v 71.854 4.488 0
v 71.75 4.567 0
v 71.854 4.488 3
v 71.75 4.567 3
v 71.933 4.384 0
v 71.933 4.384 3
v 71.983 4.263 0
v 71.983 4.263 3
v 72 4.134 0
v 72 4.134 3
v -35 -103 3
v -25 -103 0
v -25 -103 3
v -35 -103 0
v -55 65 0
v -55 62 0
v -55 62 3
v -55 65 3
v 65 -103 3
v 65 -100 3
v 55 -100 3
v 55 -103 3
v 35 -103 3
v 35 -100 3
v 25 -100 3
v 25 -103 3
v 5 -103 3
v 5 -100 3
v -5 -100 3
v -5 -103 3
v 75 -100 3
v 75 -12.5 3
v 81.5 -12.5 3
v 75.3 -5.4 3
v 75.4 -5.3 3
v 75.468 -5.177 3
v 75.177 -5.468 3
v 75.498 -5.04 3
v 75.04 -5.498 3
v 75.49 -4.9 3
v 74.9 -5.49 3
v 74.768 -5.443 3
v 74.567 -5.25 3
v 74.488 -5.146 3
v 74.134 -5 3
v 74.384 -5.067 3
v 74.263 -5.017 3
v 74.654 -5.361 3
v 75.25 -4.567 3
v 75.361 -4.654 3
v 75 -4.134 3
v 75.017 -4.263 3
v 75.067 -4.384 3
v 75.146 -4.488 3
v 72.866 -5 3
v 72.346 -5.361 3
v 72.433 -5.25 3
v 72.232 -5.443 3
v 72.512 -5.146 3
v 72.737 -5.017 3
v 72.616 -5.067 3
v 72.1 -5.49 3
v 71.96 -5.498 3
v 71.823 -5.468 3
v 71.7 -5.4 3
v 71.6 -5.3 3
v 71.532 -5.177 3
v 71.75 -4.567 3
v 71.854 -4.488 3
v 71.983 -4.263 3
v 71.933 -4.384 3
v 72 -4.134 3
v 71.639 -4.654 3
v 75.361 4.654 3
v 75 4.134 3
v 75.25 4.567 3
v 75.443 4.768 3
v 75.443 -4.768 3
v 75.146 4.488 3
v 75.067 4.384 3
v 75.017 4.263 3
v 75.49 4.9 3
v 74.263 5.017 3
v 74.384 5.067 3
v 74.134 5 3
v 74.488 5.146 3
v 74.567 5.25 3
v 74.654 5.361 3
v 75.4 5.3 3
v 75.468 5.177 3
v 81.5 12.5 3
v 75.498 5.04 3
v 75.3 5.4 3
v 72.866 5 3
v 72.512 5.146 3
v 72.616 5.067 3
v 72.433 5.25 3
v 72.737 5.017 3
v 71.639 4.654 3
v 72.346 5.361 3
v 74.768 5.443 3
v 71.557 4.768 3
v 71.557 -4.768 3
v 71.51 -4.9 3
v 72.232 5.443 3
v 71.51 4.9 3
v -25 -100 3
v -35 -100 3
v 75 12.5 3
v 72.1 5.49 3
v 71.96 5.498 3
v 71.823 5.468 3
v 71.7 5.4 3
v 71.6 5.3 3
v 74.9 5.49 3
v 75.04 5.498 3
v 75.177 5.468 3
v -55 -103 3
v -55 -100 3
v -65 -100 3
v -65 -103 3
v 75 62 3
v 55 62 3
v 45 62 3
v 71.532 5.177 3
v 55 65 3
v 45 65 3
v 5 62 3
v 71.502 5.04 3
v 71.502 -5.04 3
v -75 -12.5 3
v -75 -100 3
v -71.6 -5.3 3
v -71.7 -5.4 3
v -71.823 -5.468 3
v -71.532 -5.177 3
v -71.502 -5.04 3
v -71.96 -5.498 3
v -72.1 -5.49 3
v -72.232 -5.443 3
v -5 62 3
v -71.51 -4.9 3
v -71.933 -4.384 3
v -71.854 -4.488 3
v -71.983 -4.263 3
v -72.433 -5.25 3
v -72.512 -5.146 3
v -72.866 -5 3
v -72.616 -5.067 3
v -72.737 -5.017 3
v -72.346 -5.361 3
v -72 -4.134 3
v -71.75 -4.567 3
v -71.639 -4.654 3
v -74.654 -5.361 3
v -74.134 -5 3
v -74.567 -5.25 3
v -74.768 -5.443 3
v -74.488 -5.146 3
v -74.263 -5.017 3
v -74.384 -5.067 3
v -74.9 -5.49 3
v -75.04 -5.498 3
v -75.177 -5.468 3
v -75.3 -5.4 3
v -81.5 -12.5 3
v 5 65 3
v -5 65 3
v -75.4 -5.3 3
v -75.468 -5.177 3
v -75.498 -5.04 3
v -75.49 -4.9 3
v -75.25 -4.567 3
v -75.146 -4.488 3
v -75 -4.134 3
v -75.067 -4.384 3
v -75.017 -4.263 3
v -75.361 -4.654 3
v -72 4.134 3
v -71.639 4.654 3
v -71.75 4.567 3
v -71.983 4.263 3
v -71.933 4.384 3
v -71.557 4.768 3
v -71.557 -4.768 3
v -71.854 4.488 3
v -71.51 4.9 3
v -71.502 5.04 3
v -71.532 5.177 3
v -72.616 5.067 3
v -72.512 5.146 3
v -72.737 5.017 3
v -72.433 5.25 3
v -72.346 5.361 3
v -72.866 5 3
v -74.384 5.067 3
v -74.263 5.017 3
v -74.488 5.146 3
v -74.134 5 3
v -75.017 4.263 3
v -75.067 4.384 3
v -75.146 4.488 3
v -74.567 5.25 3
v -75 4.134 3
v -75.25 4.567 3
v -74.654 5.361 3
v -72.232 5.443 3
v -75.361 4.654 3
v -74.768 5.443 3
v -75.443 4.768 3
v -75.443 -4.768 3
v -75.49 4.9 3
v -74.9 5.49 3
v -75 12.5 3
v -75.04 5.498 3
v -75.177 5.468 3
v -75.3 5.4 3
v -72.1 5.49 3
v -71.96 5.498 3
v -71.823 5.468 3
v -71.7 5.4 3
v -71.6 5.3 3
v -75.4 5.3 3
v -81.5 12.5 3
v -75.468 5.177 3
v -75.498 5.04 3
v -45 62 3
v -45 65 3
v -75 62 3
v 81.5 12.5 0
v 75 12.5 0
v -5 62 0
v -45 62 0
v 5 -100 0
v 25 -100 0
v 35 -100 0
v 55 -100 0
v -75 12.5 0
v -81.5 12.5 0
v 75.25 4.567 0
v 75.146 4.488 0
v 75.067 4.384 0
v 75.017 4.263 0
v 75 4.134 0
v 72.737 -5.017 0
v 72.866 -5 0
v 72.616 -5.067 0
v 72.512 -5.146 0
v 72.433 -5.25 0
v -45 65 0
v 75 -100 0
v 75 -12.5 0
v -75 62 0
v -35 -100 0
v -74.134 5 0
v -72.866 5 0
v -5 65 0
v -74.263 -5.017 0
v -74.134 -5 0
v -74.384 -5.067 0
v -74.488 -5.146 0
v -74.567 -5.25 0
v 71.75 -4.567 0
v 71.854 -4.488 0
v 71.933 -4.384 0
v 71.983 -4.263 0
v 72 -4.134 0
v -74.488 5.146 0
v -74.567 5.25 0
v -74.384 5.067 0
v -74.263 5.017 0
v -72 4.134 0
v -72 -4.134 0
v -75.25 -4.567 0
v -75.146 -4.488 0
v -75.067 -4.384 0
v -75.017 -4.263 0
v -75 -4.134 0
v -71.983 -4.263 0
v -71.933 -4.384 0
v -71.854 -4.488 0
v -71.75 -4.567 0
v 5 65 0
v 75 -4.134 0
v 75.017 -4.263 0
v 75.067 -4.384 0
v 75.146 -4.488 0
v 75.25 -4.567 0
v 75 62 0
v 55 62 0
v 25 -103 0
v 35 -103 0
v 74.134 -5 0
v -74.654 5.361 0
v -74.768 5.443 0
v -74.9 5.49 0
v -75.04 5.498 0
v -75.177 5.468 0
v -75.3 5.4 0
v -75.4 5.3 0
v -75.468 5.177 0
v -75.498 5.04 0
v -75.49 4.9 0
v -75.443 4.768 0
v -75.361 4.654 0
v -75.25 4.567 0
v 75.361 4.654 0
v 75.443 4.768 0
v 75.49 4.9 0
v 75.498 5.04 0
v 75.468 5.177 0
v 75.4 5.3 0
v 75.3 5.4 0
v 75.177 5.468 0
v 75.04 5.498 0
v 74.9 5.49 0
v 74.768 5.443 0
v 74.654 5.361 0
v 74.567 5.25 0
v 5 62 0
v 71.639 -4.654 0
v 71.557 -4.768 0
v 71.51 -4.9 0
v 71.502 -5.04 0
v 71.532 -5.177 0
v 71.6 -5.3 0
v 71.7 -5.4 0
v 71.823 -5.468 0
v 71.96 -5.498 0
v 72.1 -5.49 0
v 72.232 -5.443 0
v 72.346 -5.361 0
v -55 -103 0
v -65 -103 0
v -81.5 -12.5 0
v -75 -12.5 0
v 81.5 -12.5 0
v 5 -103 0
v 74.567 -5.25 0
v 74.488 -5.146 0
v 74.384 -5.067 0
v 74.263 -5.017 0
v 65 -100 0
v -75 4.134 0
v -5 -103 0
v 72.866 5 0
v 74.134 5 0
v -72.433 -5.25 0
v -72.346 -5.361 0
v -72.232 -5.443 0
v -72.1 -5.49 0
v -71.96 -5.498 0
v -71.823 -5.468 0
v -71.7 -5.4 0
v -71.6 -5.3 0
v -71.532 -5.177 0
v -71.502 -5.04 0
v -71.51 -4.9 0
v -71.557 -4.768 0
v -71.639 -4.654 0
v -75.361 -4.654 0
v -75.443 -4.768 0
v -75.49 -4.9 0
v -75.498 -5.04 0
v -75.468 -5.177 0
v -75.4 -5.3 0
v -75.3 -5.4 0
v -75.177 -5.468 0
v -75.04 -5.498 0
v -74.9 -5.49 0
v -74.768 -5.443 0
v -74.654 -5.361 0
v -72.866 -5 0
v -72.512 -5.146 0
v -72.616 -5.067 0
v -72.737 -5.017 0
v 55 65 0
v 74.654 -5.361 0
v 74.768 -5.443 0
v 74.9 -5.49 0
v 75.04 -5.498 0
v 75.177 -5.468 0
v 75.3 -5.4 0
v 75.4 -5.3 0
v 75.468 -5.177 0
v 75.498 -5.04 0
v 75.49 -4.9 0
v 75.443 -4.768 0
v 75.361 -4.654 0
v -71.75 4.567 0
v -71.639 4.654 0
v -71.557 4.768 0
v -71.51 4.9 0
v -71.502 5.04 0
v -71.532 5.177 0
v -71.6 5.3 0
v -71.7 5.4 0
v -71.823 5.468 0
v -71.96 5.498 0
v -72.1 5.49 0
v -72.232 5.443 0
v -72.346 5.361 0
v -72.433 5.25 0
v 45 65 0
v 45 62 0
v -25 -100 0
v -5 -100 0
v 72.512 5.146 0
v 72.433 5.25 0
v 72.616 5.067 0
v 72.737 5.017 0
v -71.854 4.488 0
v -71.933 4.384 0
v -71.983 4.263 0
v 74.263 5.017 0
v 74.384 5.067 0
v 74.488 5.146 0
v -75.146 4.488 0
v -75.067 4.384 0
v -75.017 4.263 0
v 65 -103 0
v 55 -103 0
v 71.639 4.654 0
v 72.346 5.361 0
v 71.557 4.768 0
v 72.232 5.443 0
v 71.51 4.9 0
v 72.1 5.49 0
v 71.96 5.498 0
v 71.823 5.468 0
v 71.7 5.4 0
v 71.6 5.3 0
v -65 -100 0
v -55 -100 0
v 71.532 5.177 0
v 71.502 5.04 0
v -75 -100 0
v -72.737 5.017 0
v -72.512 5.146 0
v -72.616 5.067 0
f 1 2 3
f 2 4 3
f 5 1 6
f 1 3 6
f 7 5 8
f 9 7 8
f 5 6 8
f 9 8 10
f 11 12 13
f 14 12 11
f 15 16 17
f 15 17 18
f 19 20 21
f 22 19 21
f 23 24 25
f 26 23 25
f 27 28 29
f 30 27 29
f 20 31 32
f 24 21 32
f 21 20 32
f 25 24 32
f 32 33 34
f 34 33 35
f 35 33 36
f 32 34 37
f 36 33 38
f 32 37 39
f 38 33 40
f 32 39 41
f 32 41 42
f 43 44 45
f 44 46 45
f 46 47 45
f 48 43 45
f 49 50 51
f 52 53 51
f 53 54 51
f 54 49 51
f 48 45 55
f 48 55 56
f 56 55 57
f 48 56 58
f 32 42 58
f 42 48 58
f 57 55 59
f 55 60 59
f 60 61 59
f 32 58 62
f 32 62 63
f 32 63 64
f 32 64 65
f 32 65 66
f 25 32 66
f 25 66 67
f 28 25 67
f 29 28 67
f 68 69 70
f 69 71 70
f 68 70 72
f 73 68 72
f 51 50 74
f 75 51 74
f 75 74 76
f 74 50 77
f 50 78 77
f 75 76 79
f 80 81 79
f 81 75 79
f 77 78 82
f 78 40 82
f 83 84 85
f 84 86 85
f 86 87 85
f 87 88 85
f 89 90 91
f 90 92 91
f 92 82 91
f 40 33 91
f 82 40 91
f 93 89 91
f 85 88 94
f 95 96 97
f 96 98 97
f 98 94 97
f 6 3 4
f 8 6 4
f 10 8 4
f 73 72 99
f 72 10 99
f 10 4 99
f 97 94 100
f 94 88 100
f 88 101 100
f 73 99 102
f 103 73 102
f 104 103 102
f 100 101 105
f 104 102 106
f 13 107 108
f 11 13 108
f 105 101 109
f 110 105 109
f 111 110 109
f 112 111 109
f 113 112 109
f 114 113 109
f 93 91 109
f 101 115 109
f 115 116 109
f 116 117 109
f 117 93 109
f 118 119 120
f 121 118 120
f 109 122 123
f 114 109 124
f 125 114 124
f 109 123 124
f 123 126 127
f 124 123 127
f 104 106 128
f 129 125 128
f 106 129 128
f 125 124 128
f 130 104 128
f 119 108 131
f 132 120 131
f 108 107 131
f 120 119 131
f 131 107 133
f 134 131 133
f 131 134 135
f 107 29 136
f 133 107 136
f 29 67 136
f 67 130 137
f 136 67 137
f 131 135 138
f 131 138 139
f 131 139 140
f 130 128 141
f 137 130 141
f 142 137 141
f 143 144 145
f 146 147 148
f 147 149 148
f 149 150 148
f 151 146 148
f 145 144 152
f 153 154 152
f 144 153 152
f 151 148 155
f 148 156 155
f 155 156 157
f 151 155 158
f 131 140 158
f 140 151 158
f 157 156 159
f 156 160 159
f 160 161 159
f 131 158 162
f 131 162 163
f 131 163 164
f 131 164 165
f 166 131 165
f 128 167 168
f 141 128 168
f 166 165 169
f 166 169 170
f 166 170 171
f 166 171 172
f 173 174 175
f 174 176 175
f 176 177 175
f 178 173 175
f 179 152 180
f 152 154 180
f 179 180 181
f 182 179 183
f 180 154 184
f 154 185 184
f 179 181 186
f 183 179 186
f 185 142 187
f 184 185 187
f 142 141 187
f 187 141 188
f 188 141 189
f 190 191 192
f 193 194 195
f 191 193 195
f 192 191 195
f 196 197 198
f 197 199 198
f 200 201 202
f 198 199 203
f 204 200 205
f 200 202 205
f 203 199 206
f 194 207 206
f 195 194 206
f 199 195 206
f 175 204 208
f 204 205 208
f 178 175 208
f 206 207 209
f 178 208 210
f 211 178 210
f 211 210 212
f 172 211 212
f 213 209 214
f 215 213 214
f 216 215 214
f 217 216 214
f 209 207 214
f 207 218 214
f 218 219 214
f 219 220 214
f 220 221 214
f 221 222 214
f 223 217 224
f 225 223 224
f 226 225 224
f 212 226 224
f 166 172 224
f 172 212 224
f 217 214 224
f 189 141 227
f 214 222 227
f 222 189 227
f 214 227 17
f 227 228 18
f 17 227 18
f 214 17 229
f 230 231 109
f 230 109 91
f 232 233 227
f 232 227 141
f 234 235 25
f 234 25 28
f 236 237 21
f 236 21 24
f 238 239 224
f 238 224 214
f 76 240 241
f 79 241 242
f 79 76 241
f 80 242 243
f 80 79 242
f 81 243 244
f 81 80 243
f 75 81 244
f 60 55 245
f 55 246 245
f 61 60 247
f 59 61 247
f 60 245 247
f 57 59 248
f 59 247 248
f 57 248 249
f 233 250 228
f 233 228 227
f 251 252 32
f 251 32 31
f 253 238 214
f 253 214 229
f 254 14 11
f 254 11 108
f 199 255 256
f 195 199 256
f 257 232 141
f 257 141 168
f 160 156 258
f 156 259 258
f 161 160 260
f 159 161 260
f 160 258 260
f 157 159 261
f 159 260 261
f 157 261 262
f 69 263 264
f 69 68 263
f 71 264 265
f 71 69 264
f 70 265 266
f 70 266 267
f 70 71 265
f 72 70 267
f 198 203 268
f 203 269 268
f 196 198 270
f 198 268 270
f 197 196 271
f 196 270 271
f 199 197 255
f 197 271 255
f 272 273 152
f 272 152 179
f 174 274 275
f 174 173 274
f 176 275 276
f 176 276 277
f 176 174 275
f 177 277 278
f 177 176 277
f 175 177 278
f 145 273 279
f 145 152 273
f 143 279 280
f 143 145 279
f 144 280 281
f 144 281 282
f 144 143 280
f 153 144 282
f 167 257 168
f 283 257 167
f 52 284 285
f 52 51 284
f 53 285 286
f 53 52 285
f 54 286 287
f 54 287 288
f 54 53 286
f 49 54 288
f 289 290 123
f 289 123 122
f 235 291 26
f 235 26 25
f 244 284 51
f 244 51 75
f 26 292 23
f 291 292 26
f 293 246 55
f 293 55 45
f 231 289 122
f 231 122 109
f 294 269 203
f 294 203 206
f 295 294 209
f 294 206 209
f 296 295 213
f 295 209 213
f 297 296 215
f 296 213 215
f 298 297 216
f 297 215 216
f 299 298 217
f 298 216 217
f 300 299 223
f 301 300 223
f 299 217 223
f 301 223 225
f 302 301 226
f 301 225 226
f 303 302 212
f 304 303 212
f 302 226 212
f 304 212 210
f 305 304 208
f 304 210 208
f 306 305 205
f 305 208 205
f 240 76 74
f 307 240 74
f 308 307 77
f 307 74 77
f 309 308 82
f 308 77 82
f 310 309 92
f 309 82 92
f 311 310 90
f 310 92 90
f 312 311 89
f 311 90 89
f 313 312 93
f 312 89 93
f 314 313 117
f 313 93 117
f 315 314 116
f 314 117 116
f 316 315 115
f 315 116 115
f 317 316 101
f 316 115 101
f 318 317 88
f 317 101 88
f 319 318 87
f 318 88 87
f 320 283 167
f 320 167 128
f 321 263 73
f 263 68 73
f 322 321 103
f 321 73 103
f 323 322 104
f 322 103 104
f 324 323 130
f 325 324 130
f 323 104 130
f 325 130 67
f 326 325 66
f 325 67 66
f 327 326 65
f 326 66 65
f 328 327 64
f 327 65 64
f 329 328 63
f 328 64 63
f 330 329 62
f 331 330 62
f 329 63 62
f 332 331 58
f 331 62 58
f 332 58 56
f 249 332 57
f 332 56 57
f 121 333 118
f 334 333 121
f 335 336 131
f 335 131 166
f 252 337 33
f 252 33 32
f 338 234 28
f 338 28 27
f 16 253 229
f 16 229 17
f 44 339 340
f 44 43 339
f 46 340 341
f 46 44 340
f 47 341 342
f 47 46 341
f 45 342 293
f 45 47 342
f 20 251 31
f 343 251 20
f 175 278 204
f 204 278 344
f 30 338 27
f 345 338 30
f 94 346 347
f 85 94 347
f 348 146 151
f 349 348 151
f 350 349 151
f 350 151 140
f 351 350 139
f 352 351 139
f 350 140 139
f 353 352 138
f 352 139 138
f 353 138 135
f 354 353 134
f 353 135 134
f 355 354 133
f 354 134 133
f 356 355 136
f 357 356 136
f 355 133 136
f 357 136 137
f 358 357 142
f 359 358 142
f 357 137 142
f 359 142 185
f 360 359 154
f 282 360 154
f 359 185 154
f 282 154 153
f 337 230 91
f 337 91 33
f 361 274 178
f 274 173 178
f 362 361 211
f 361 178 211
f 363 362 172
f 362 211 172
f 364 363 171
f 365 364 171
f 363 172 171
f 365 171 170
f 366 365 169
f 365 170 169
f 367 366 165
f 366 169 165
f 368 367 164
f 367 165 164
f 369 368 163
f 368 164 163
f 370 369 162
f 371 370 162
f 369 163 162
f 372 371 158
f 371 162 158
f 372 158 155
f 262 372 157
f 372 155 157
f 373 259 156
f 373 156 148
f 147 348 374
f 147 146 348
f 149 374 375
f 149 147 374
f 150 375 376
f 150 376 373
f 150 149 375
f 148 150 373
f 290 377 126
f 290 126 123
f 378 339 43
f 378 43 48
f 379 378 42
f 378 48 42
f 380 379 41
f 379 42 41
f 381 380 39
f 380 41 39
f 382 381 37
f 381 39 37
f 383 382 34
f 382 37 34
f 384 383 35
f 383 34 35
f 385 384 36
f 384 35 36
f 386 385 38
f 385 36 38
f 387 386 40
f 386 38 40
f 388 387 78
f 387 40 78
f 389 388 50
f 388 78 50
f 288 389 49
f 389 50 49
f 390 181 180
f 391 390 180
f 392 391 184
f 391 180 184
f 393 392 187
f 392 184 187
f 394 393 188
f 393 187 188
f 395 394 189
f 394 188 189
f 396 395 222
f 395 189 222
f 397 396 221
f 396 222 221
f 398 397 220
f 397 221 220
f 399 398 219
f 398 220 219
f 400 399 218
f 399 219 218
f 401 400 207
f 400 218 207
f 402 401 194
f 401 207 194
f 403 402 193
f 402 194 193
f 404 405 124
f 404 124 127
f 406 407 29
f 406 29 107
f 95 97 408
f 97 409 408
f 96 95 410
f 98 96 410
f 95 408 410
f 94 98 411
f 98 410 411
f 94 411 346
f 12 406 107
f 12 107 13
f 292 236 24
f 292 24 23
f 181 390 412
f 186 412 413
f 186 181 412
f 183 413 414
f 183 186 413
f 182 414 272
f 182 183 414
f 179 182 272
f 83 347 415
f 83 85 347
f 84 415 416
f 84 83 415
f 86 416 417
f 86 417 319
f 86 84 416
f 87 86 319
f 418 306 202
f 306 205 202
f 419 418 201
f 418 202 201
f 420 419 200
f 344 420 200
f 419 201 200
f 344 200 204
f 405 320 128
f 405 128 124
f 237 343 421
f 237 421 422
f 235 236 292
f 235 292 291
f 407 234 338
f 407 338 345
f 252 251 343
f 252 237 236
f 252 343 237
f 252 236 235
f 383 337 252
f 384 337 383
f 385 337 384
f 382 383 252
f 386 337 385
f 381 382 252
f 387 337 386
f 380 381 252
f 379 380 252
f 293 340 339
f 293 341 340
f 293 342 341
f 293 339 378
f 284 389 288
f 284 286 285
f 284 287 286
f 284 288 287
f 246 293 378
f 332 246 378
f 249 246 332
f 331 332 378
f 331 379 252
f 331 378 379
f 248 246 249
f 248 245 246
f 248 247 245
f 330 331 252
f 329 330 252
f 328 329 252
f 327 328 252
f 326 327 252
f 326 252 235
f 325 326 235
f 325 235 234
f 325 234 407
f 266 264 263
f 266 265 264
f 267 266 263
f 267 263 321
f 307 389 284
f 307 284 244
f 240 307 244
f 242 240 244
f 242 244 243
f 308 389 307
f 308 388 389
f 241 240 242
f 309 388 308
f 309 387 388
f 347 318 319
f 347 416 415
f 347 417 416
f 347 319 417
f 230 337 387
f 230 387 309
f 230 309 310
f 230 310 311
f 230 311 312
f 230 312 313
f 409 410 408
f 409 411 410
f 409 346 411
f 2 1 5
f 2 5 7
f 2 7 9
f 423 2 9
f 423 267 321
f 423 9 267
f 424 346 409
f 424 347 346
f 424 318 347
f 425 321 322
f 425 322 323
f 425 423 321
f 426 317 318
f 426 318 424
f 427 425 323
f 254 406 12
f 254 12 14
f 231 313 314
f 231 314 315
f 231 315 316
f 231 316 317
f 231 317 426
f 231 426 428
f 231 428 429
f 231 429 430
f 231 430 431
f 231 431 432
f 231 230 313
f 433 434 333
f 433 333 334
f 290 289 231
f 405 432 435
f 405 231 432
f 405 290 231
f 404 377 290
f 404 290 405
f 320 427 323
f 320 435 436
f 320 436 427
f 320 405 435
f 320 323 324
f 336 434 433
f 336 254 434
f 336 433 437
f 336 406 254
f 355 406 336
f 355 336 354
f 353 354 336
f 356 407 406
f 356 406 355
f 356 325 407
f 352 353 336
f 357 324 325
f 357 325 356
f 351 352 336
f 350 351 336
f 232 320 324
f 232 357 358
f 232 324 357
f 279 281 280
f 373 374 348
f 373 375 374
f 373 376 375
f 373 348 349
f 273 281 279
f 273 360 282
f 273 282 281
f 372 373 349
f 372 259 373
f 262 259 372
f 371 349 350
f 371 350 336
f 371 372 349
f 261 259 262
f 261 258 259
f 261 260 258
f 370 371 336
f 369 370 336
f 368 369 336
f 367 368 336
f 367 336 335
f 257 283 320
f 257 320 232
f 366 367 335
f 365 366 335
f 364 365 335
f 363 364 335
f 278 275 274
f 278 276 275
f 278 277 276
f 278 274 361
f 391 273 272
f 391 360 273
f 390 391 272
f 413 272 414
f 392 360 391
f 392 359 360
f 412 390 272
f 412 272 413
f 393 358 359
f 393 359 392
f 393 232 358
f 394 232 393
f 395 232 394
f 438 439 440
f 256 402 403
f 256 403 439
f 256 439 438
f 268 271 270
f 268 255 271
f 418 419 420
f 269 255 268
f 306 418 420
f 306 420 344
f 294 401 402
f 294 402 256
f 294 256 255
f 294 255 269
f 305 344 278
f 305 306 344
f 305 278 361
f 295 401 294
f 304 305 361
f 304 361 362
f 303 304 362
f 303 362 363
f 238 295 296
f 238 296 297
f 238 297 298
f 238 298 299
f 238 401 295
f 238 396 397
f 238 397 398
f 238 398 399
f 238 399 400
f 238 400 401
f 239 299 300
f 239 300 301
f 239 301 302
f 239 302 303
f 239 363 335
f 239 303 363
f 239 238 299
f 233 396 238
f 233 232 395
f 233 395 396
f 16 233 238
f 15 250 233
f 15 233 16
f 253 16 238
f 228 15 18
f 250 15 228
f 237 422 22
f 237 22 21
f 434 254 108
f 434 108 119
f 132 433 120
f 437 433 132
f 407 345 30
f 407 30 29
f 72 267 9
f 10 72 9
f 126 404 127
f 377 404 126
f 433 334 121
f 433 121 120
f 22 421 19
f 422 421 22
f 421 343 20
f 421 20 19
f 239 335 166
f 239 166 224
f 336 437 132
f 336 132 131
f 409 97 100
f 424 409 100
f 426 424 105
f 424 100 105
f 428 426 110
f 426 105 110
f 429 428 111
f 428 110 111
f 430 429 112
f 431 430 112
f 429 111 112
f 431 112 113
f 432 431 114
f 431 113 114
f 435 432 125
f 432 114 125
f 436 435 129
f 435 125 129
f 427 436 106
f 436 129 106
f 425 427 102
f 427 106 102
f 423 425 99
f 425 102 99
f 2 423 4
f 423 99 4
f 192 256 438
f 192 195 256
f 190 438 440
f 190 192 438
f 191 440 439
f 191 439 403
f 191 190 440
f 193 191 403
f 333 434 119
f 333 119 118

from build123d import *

# Parameters (mm, degrees)
SKETCH1_W           = 3
SKETCH1_H           = 10
BOSS_EXTRUDE2_DEPTH = 3
SKETCH2_R           = 0.5
CUT_EXTRUDE1_DEPTH  = 132.378270654
FILLET1_R           = 0.5


with BuildPart() as part:
    # Sketch1 → Boss-Extrude2 (new body)
    with BuildSketch(Plane.XY):
        Polygon((-5, 65), (5, 65), (5, 62), (45, 62), (45, 65), (55, 65), (55, 62), (75, 62), (75, 12.5), (81.5, 12.5), (81.5, -12.5), (75, -12.5), (75, -100), (65, -100), (65, -103), (55, -103), (55, -100), (35, -100), (35, -103), (25, -103), (25, -100), (5, -100), (5, -103), (-5, -103), (-5, -100), (-25, -100), (-25, -103), (-35, -103), (-35, -100), (-55, -100), (-55, -103), (-65, -103), (-65, -100), (-75, -100), (-75, -12.5), (-81.5, -12.5), (-81.5, 12.5), (-75, 12.5), (-75, 62), (-55, 62), (-55, 65), (-45, 65), (-45, 62), (-5, 62), align=None)
        with Locations((-73.5, 0)):
            Rectangle(SKETCH1_W, SKETCH1_H, mode=Mode.SUBTRACT)
        with Locations((73.5, 0)):
            Rectangle(SKETCH1_W, SKETCH1_H, mode=Mode.SUBTRACT)
    extrude(amount=BOSS_EXTRUDE2_DEPTH)

    # Sketch2 → Cut-Extrude1 (cut, through all)
    with BuildSketch(Plane.XY.offset(3)):
        with Locations((-72, 5)):
            Circle(SKETCH2_R)
        with Locations((-72, -5)):
            Circle(SKETCH2_R)
        with Locations((-75, 5)):
            Circle(SKETCH2_R)
        with Locations((-75, -5)):
            Circle(SKETCH2_R)
        with Locations((75, -5)):
            Circle(SKETCH2_R)
        with Locations((72, -5)):
            Circle(SKETCH2_R)
        with Locations((72, 5)):
            Circle(SKETCH2_R)
        with Locations((75, 5)):
            Circle(SKETCH2_R)
    extrude(amount=-CUT_EXTRUDE1_DEPTH, mode=Mode.SUBTRACT)

    # Fillet1
    fillet1_edges = [part.edges().sort_by_distance(p)[0] for p in [
        (75, 4.5, 1.5),
        (75, -4.5, 1.5),
        (72.5, -5, 1.5),
        (72, 4.5, 1.5),
        (-72.5, -5, 1.5),
        (-74.5, -5, 1.5),
        (-75, 4.5, 1.5),
        (-72.5, 5, 1.5),
        (74.5, -5, 1.5),
        (-75, -4.5, 1.5),
        (-74.5, 5, 1.5),
        (-72, -4.5, 1.5),
        (72, -4.5, 1.5),
        (72.5, 5, 1.5),
        (74.5, 5, 1.5),
        (-72, 4.5, 1.5),
    ]]
    fillet(fillet1_edges, radius=FILLET1_R)


solid = part.part
